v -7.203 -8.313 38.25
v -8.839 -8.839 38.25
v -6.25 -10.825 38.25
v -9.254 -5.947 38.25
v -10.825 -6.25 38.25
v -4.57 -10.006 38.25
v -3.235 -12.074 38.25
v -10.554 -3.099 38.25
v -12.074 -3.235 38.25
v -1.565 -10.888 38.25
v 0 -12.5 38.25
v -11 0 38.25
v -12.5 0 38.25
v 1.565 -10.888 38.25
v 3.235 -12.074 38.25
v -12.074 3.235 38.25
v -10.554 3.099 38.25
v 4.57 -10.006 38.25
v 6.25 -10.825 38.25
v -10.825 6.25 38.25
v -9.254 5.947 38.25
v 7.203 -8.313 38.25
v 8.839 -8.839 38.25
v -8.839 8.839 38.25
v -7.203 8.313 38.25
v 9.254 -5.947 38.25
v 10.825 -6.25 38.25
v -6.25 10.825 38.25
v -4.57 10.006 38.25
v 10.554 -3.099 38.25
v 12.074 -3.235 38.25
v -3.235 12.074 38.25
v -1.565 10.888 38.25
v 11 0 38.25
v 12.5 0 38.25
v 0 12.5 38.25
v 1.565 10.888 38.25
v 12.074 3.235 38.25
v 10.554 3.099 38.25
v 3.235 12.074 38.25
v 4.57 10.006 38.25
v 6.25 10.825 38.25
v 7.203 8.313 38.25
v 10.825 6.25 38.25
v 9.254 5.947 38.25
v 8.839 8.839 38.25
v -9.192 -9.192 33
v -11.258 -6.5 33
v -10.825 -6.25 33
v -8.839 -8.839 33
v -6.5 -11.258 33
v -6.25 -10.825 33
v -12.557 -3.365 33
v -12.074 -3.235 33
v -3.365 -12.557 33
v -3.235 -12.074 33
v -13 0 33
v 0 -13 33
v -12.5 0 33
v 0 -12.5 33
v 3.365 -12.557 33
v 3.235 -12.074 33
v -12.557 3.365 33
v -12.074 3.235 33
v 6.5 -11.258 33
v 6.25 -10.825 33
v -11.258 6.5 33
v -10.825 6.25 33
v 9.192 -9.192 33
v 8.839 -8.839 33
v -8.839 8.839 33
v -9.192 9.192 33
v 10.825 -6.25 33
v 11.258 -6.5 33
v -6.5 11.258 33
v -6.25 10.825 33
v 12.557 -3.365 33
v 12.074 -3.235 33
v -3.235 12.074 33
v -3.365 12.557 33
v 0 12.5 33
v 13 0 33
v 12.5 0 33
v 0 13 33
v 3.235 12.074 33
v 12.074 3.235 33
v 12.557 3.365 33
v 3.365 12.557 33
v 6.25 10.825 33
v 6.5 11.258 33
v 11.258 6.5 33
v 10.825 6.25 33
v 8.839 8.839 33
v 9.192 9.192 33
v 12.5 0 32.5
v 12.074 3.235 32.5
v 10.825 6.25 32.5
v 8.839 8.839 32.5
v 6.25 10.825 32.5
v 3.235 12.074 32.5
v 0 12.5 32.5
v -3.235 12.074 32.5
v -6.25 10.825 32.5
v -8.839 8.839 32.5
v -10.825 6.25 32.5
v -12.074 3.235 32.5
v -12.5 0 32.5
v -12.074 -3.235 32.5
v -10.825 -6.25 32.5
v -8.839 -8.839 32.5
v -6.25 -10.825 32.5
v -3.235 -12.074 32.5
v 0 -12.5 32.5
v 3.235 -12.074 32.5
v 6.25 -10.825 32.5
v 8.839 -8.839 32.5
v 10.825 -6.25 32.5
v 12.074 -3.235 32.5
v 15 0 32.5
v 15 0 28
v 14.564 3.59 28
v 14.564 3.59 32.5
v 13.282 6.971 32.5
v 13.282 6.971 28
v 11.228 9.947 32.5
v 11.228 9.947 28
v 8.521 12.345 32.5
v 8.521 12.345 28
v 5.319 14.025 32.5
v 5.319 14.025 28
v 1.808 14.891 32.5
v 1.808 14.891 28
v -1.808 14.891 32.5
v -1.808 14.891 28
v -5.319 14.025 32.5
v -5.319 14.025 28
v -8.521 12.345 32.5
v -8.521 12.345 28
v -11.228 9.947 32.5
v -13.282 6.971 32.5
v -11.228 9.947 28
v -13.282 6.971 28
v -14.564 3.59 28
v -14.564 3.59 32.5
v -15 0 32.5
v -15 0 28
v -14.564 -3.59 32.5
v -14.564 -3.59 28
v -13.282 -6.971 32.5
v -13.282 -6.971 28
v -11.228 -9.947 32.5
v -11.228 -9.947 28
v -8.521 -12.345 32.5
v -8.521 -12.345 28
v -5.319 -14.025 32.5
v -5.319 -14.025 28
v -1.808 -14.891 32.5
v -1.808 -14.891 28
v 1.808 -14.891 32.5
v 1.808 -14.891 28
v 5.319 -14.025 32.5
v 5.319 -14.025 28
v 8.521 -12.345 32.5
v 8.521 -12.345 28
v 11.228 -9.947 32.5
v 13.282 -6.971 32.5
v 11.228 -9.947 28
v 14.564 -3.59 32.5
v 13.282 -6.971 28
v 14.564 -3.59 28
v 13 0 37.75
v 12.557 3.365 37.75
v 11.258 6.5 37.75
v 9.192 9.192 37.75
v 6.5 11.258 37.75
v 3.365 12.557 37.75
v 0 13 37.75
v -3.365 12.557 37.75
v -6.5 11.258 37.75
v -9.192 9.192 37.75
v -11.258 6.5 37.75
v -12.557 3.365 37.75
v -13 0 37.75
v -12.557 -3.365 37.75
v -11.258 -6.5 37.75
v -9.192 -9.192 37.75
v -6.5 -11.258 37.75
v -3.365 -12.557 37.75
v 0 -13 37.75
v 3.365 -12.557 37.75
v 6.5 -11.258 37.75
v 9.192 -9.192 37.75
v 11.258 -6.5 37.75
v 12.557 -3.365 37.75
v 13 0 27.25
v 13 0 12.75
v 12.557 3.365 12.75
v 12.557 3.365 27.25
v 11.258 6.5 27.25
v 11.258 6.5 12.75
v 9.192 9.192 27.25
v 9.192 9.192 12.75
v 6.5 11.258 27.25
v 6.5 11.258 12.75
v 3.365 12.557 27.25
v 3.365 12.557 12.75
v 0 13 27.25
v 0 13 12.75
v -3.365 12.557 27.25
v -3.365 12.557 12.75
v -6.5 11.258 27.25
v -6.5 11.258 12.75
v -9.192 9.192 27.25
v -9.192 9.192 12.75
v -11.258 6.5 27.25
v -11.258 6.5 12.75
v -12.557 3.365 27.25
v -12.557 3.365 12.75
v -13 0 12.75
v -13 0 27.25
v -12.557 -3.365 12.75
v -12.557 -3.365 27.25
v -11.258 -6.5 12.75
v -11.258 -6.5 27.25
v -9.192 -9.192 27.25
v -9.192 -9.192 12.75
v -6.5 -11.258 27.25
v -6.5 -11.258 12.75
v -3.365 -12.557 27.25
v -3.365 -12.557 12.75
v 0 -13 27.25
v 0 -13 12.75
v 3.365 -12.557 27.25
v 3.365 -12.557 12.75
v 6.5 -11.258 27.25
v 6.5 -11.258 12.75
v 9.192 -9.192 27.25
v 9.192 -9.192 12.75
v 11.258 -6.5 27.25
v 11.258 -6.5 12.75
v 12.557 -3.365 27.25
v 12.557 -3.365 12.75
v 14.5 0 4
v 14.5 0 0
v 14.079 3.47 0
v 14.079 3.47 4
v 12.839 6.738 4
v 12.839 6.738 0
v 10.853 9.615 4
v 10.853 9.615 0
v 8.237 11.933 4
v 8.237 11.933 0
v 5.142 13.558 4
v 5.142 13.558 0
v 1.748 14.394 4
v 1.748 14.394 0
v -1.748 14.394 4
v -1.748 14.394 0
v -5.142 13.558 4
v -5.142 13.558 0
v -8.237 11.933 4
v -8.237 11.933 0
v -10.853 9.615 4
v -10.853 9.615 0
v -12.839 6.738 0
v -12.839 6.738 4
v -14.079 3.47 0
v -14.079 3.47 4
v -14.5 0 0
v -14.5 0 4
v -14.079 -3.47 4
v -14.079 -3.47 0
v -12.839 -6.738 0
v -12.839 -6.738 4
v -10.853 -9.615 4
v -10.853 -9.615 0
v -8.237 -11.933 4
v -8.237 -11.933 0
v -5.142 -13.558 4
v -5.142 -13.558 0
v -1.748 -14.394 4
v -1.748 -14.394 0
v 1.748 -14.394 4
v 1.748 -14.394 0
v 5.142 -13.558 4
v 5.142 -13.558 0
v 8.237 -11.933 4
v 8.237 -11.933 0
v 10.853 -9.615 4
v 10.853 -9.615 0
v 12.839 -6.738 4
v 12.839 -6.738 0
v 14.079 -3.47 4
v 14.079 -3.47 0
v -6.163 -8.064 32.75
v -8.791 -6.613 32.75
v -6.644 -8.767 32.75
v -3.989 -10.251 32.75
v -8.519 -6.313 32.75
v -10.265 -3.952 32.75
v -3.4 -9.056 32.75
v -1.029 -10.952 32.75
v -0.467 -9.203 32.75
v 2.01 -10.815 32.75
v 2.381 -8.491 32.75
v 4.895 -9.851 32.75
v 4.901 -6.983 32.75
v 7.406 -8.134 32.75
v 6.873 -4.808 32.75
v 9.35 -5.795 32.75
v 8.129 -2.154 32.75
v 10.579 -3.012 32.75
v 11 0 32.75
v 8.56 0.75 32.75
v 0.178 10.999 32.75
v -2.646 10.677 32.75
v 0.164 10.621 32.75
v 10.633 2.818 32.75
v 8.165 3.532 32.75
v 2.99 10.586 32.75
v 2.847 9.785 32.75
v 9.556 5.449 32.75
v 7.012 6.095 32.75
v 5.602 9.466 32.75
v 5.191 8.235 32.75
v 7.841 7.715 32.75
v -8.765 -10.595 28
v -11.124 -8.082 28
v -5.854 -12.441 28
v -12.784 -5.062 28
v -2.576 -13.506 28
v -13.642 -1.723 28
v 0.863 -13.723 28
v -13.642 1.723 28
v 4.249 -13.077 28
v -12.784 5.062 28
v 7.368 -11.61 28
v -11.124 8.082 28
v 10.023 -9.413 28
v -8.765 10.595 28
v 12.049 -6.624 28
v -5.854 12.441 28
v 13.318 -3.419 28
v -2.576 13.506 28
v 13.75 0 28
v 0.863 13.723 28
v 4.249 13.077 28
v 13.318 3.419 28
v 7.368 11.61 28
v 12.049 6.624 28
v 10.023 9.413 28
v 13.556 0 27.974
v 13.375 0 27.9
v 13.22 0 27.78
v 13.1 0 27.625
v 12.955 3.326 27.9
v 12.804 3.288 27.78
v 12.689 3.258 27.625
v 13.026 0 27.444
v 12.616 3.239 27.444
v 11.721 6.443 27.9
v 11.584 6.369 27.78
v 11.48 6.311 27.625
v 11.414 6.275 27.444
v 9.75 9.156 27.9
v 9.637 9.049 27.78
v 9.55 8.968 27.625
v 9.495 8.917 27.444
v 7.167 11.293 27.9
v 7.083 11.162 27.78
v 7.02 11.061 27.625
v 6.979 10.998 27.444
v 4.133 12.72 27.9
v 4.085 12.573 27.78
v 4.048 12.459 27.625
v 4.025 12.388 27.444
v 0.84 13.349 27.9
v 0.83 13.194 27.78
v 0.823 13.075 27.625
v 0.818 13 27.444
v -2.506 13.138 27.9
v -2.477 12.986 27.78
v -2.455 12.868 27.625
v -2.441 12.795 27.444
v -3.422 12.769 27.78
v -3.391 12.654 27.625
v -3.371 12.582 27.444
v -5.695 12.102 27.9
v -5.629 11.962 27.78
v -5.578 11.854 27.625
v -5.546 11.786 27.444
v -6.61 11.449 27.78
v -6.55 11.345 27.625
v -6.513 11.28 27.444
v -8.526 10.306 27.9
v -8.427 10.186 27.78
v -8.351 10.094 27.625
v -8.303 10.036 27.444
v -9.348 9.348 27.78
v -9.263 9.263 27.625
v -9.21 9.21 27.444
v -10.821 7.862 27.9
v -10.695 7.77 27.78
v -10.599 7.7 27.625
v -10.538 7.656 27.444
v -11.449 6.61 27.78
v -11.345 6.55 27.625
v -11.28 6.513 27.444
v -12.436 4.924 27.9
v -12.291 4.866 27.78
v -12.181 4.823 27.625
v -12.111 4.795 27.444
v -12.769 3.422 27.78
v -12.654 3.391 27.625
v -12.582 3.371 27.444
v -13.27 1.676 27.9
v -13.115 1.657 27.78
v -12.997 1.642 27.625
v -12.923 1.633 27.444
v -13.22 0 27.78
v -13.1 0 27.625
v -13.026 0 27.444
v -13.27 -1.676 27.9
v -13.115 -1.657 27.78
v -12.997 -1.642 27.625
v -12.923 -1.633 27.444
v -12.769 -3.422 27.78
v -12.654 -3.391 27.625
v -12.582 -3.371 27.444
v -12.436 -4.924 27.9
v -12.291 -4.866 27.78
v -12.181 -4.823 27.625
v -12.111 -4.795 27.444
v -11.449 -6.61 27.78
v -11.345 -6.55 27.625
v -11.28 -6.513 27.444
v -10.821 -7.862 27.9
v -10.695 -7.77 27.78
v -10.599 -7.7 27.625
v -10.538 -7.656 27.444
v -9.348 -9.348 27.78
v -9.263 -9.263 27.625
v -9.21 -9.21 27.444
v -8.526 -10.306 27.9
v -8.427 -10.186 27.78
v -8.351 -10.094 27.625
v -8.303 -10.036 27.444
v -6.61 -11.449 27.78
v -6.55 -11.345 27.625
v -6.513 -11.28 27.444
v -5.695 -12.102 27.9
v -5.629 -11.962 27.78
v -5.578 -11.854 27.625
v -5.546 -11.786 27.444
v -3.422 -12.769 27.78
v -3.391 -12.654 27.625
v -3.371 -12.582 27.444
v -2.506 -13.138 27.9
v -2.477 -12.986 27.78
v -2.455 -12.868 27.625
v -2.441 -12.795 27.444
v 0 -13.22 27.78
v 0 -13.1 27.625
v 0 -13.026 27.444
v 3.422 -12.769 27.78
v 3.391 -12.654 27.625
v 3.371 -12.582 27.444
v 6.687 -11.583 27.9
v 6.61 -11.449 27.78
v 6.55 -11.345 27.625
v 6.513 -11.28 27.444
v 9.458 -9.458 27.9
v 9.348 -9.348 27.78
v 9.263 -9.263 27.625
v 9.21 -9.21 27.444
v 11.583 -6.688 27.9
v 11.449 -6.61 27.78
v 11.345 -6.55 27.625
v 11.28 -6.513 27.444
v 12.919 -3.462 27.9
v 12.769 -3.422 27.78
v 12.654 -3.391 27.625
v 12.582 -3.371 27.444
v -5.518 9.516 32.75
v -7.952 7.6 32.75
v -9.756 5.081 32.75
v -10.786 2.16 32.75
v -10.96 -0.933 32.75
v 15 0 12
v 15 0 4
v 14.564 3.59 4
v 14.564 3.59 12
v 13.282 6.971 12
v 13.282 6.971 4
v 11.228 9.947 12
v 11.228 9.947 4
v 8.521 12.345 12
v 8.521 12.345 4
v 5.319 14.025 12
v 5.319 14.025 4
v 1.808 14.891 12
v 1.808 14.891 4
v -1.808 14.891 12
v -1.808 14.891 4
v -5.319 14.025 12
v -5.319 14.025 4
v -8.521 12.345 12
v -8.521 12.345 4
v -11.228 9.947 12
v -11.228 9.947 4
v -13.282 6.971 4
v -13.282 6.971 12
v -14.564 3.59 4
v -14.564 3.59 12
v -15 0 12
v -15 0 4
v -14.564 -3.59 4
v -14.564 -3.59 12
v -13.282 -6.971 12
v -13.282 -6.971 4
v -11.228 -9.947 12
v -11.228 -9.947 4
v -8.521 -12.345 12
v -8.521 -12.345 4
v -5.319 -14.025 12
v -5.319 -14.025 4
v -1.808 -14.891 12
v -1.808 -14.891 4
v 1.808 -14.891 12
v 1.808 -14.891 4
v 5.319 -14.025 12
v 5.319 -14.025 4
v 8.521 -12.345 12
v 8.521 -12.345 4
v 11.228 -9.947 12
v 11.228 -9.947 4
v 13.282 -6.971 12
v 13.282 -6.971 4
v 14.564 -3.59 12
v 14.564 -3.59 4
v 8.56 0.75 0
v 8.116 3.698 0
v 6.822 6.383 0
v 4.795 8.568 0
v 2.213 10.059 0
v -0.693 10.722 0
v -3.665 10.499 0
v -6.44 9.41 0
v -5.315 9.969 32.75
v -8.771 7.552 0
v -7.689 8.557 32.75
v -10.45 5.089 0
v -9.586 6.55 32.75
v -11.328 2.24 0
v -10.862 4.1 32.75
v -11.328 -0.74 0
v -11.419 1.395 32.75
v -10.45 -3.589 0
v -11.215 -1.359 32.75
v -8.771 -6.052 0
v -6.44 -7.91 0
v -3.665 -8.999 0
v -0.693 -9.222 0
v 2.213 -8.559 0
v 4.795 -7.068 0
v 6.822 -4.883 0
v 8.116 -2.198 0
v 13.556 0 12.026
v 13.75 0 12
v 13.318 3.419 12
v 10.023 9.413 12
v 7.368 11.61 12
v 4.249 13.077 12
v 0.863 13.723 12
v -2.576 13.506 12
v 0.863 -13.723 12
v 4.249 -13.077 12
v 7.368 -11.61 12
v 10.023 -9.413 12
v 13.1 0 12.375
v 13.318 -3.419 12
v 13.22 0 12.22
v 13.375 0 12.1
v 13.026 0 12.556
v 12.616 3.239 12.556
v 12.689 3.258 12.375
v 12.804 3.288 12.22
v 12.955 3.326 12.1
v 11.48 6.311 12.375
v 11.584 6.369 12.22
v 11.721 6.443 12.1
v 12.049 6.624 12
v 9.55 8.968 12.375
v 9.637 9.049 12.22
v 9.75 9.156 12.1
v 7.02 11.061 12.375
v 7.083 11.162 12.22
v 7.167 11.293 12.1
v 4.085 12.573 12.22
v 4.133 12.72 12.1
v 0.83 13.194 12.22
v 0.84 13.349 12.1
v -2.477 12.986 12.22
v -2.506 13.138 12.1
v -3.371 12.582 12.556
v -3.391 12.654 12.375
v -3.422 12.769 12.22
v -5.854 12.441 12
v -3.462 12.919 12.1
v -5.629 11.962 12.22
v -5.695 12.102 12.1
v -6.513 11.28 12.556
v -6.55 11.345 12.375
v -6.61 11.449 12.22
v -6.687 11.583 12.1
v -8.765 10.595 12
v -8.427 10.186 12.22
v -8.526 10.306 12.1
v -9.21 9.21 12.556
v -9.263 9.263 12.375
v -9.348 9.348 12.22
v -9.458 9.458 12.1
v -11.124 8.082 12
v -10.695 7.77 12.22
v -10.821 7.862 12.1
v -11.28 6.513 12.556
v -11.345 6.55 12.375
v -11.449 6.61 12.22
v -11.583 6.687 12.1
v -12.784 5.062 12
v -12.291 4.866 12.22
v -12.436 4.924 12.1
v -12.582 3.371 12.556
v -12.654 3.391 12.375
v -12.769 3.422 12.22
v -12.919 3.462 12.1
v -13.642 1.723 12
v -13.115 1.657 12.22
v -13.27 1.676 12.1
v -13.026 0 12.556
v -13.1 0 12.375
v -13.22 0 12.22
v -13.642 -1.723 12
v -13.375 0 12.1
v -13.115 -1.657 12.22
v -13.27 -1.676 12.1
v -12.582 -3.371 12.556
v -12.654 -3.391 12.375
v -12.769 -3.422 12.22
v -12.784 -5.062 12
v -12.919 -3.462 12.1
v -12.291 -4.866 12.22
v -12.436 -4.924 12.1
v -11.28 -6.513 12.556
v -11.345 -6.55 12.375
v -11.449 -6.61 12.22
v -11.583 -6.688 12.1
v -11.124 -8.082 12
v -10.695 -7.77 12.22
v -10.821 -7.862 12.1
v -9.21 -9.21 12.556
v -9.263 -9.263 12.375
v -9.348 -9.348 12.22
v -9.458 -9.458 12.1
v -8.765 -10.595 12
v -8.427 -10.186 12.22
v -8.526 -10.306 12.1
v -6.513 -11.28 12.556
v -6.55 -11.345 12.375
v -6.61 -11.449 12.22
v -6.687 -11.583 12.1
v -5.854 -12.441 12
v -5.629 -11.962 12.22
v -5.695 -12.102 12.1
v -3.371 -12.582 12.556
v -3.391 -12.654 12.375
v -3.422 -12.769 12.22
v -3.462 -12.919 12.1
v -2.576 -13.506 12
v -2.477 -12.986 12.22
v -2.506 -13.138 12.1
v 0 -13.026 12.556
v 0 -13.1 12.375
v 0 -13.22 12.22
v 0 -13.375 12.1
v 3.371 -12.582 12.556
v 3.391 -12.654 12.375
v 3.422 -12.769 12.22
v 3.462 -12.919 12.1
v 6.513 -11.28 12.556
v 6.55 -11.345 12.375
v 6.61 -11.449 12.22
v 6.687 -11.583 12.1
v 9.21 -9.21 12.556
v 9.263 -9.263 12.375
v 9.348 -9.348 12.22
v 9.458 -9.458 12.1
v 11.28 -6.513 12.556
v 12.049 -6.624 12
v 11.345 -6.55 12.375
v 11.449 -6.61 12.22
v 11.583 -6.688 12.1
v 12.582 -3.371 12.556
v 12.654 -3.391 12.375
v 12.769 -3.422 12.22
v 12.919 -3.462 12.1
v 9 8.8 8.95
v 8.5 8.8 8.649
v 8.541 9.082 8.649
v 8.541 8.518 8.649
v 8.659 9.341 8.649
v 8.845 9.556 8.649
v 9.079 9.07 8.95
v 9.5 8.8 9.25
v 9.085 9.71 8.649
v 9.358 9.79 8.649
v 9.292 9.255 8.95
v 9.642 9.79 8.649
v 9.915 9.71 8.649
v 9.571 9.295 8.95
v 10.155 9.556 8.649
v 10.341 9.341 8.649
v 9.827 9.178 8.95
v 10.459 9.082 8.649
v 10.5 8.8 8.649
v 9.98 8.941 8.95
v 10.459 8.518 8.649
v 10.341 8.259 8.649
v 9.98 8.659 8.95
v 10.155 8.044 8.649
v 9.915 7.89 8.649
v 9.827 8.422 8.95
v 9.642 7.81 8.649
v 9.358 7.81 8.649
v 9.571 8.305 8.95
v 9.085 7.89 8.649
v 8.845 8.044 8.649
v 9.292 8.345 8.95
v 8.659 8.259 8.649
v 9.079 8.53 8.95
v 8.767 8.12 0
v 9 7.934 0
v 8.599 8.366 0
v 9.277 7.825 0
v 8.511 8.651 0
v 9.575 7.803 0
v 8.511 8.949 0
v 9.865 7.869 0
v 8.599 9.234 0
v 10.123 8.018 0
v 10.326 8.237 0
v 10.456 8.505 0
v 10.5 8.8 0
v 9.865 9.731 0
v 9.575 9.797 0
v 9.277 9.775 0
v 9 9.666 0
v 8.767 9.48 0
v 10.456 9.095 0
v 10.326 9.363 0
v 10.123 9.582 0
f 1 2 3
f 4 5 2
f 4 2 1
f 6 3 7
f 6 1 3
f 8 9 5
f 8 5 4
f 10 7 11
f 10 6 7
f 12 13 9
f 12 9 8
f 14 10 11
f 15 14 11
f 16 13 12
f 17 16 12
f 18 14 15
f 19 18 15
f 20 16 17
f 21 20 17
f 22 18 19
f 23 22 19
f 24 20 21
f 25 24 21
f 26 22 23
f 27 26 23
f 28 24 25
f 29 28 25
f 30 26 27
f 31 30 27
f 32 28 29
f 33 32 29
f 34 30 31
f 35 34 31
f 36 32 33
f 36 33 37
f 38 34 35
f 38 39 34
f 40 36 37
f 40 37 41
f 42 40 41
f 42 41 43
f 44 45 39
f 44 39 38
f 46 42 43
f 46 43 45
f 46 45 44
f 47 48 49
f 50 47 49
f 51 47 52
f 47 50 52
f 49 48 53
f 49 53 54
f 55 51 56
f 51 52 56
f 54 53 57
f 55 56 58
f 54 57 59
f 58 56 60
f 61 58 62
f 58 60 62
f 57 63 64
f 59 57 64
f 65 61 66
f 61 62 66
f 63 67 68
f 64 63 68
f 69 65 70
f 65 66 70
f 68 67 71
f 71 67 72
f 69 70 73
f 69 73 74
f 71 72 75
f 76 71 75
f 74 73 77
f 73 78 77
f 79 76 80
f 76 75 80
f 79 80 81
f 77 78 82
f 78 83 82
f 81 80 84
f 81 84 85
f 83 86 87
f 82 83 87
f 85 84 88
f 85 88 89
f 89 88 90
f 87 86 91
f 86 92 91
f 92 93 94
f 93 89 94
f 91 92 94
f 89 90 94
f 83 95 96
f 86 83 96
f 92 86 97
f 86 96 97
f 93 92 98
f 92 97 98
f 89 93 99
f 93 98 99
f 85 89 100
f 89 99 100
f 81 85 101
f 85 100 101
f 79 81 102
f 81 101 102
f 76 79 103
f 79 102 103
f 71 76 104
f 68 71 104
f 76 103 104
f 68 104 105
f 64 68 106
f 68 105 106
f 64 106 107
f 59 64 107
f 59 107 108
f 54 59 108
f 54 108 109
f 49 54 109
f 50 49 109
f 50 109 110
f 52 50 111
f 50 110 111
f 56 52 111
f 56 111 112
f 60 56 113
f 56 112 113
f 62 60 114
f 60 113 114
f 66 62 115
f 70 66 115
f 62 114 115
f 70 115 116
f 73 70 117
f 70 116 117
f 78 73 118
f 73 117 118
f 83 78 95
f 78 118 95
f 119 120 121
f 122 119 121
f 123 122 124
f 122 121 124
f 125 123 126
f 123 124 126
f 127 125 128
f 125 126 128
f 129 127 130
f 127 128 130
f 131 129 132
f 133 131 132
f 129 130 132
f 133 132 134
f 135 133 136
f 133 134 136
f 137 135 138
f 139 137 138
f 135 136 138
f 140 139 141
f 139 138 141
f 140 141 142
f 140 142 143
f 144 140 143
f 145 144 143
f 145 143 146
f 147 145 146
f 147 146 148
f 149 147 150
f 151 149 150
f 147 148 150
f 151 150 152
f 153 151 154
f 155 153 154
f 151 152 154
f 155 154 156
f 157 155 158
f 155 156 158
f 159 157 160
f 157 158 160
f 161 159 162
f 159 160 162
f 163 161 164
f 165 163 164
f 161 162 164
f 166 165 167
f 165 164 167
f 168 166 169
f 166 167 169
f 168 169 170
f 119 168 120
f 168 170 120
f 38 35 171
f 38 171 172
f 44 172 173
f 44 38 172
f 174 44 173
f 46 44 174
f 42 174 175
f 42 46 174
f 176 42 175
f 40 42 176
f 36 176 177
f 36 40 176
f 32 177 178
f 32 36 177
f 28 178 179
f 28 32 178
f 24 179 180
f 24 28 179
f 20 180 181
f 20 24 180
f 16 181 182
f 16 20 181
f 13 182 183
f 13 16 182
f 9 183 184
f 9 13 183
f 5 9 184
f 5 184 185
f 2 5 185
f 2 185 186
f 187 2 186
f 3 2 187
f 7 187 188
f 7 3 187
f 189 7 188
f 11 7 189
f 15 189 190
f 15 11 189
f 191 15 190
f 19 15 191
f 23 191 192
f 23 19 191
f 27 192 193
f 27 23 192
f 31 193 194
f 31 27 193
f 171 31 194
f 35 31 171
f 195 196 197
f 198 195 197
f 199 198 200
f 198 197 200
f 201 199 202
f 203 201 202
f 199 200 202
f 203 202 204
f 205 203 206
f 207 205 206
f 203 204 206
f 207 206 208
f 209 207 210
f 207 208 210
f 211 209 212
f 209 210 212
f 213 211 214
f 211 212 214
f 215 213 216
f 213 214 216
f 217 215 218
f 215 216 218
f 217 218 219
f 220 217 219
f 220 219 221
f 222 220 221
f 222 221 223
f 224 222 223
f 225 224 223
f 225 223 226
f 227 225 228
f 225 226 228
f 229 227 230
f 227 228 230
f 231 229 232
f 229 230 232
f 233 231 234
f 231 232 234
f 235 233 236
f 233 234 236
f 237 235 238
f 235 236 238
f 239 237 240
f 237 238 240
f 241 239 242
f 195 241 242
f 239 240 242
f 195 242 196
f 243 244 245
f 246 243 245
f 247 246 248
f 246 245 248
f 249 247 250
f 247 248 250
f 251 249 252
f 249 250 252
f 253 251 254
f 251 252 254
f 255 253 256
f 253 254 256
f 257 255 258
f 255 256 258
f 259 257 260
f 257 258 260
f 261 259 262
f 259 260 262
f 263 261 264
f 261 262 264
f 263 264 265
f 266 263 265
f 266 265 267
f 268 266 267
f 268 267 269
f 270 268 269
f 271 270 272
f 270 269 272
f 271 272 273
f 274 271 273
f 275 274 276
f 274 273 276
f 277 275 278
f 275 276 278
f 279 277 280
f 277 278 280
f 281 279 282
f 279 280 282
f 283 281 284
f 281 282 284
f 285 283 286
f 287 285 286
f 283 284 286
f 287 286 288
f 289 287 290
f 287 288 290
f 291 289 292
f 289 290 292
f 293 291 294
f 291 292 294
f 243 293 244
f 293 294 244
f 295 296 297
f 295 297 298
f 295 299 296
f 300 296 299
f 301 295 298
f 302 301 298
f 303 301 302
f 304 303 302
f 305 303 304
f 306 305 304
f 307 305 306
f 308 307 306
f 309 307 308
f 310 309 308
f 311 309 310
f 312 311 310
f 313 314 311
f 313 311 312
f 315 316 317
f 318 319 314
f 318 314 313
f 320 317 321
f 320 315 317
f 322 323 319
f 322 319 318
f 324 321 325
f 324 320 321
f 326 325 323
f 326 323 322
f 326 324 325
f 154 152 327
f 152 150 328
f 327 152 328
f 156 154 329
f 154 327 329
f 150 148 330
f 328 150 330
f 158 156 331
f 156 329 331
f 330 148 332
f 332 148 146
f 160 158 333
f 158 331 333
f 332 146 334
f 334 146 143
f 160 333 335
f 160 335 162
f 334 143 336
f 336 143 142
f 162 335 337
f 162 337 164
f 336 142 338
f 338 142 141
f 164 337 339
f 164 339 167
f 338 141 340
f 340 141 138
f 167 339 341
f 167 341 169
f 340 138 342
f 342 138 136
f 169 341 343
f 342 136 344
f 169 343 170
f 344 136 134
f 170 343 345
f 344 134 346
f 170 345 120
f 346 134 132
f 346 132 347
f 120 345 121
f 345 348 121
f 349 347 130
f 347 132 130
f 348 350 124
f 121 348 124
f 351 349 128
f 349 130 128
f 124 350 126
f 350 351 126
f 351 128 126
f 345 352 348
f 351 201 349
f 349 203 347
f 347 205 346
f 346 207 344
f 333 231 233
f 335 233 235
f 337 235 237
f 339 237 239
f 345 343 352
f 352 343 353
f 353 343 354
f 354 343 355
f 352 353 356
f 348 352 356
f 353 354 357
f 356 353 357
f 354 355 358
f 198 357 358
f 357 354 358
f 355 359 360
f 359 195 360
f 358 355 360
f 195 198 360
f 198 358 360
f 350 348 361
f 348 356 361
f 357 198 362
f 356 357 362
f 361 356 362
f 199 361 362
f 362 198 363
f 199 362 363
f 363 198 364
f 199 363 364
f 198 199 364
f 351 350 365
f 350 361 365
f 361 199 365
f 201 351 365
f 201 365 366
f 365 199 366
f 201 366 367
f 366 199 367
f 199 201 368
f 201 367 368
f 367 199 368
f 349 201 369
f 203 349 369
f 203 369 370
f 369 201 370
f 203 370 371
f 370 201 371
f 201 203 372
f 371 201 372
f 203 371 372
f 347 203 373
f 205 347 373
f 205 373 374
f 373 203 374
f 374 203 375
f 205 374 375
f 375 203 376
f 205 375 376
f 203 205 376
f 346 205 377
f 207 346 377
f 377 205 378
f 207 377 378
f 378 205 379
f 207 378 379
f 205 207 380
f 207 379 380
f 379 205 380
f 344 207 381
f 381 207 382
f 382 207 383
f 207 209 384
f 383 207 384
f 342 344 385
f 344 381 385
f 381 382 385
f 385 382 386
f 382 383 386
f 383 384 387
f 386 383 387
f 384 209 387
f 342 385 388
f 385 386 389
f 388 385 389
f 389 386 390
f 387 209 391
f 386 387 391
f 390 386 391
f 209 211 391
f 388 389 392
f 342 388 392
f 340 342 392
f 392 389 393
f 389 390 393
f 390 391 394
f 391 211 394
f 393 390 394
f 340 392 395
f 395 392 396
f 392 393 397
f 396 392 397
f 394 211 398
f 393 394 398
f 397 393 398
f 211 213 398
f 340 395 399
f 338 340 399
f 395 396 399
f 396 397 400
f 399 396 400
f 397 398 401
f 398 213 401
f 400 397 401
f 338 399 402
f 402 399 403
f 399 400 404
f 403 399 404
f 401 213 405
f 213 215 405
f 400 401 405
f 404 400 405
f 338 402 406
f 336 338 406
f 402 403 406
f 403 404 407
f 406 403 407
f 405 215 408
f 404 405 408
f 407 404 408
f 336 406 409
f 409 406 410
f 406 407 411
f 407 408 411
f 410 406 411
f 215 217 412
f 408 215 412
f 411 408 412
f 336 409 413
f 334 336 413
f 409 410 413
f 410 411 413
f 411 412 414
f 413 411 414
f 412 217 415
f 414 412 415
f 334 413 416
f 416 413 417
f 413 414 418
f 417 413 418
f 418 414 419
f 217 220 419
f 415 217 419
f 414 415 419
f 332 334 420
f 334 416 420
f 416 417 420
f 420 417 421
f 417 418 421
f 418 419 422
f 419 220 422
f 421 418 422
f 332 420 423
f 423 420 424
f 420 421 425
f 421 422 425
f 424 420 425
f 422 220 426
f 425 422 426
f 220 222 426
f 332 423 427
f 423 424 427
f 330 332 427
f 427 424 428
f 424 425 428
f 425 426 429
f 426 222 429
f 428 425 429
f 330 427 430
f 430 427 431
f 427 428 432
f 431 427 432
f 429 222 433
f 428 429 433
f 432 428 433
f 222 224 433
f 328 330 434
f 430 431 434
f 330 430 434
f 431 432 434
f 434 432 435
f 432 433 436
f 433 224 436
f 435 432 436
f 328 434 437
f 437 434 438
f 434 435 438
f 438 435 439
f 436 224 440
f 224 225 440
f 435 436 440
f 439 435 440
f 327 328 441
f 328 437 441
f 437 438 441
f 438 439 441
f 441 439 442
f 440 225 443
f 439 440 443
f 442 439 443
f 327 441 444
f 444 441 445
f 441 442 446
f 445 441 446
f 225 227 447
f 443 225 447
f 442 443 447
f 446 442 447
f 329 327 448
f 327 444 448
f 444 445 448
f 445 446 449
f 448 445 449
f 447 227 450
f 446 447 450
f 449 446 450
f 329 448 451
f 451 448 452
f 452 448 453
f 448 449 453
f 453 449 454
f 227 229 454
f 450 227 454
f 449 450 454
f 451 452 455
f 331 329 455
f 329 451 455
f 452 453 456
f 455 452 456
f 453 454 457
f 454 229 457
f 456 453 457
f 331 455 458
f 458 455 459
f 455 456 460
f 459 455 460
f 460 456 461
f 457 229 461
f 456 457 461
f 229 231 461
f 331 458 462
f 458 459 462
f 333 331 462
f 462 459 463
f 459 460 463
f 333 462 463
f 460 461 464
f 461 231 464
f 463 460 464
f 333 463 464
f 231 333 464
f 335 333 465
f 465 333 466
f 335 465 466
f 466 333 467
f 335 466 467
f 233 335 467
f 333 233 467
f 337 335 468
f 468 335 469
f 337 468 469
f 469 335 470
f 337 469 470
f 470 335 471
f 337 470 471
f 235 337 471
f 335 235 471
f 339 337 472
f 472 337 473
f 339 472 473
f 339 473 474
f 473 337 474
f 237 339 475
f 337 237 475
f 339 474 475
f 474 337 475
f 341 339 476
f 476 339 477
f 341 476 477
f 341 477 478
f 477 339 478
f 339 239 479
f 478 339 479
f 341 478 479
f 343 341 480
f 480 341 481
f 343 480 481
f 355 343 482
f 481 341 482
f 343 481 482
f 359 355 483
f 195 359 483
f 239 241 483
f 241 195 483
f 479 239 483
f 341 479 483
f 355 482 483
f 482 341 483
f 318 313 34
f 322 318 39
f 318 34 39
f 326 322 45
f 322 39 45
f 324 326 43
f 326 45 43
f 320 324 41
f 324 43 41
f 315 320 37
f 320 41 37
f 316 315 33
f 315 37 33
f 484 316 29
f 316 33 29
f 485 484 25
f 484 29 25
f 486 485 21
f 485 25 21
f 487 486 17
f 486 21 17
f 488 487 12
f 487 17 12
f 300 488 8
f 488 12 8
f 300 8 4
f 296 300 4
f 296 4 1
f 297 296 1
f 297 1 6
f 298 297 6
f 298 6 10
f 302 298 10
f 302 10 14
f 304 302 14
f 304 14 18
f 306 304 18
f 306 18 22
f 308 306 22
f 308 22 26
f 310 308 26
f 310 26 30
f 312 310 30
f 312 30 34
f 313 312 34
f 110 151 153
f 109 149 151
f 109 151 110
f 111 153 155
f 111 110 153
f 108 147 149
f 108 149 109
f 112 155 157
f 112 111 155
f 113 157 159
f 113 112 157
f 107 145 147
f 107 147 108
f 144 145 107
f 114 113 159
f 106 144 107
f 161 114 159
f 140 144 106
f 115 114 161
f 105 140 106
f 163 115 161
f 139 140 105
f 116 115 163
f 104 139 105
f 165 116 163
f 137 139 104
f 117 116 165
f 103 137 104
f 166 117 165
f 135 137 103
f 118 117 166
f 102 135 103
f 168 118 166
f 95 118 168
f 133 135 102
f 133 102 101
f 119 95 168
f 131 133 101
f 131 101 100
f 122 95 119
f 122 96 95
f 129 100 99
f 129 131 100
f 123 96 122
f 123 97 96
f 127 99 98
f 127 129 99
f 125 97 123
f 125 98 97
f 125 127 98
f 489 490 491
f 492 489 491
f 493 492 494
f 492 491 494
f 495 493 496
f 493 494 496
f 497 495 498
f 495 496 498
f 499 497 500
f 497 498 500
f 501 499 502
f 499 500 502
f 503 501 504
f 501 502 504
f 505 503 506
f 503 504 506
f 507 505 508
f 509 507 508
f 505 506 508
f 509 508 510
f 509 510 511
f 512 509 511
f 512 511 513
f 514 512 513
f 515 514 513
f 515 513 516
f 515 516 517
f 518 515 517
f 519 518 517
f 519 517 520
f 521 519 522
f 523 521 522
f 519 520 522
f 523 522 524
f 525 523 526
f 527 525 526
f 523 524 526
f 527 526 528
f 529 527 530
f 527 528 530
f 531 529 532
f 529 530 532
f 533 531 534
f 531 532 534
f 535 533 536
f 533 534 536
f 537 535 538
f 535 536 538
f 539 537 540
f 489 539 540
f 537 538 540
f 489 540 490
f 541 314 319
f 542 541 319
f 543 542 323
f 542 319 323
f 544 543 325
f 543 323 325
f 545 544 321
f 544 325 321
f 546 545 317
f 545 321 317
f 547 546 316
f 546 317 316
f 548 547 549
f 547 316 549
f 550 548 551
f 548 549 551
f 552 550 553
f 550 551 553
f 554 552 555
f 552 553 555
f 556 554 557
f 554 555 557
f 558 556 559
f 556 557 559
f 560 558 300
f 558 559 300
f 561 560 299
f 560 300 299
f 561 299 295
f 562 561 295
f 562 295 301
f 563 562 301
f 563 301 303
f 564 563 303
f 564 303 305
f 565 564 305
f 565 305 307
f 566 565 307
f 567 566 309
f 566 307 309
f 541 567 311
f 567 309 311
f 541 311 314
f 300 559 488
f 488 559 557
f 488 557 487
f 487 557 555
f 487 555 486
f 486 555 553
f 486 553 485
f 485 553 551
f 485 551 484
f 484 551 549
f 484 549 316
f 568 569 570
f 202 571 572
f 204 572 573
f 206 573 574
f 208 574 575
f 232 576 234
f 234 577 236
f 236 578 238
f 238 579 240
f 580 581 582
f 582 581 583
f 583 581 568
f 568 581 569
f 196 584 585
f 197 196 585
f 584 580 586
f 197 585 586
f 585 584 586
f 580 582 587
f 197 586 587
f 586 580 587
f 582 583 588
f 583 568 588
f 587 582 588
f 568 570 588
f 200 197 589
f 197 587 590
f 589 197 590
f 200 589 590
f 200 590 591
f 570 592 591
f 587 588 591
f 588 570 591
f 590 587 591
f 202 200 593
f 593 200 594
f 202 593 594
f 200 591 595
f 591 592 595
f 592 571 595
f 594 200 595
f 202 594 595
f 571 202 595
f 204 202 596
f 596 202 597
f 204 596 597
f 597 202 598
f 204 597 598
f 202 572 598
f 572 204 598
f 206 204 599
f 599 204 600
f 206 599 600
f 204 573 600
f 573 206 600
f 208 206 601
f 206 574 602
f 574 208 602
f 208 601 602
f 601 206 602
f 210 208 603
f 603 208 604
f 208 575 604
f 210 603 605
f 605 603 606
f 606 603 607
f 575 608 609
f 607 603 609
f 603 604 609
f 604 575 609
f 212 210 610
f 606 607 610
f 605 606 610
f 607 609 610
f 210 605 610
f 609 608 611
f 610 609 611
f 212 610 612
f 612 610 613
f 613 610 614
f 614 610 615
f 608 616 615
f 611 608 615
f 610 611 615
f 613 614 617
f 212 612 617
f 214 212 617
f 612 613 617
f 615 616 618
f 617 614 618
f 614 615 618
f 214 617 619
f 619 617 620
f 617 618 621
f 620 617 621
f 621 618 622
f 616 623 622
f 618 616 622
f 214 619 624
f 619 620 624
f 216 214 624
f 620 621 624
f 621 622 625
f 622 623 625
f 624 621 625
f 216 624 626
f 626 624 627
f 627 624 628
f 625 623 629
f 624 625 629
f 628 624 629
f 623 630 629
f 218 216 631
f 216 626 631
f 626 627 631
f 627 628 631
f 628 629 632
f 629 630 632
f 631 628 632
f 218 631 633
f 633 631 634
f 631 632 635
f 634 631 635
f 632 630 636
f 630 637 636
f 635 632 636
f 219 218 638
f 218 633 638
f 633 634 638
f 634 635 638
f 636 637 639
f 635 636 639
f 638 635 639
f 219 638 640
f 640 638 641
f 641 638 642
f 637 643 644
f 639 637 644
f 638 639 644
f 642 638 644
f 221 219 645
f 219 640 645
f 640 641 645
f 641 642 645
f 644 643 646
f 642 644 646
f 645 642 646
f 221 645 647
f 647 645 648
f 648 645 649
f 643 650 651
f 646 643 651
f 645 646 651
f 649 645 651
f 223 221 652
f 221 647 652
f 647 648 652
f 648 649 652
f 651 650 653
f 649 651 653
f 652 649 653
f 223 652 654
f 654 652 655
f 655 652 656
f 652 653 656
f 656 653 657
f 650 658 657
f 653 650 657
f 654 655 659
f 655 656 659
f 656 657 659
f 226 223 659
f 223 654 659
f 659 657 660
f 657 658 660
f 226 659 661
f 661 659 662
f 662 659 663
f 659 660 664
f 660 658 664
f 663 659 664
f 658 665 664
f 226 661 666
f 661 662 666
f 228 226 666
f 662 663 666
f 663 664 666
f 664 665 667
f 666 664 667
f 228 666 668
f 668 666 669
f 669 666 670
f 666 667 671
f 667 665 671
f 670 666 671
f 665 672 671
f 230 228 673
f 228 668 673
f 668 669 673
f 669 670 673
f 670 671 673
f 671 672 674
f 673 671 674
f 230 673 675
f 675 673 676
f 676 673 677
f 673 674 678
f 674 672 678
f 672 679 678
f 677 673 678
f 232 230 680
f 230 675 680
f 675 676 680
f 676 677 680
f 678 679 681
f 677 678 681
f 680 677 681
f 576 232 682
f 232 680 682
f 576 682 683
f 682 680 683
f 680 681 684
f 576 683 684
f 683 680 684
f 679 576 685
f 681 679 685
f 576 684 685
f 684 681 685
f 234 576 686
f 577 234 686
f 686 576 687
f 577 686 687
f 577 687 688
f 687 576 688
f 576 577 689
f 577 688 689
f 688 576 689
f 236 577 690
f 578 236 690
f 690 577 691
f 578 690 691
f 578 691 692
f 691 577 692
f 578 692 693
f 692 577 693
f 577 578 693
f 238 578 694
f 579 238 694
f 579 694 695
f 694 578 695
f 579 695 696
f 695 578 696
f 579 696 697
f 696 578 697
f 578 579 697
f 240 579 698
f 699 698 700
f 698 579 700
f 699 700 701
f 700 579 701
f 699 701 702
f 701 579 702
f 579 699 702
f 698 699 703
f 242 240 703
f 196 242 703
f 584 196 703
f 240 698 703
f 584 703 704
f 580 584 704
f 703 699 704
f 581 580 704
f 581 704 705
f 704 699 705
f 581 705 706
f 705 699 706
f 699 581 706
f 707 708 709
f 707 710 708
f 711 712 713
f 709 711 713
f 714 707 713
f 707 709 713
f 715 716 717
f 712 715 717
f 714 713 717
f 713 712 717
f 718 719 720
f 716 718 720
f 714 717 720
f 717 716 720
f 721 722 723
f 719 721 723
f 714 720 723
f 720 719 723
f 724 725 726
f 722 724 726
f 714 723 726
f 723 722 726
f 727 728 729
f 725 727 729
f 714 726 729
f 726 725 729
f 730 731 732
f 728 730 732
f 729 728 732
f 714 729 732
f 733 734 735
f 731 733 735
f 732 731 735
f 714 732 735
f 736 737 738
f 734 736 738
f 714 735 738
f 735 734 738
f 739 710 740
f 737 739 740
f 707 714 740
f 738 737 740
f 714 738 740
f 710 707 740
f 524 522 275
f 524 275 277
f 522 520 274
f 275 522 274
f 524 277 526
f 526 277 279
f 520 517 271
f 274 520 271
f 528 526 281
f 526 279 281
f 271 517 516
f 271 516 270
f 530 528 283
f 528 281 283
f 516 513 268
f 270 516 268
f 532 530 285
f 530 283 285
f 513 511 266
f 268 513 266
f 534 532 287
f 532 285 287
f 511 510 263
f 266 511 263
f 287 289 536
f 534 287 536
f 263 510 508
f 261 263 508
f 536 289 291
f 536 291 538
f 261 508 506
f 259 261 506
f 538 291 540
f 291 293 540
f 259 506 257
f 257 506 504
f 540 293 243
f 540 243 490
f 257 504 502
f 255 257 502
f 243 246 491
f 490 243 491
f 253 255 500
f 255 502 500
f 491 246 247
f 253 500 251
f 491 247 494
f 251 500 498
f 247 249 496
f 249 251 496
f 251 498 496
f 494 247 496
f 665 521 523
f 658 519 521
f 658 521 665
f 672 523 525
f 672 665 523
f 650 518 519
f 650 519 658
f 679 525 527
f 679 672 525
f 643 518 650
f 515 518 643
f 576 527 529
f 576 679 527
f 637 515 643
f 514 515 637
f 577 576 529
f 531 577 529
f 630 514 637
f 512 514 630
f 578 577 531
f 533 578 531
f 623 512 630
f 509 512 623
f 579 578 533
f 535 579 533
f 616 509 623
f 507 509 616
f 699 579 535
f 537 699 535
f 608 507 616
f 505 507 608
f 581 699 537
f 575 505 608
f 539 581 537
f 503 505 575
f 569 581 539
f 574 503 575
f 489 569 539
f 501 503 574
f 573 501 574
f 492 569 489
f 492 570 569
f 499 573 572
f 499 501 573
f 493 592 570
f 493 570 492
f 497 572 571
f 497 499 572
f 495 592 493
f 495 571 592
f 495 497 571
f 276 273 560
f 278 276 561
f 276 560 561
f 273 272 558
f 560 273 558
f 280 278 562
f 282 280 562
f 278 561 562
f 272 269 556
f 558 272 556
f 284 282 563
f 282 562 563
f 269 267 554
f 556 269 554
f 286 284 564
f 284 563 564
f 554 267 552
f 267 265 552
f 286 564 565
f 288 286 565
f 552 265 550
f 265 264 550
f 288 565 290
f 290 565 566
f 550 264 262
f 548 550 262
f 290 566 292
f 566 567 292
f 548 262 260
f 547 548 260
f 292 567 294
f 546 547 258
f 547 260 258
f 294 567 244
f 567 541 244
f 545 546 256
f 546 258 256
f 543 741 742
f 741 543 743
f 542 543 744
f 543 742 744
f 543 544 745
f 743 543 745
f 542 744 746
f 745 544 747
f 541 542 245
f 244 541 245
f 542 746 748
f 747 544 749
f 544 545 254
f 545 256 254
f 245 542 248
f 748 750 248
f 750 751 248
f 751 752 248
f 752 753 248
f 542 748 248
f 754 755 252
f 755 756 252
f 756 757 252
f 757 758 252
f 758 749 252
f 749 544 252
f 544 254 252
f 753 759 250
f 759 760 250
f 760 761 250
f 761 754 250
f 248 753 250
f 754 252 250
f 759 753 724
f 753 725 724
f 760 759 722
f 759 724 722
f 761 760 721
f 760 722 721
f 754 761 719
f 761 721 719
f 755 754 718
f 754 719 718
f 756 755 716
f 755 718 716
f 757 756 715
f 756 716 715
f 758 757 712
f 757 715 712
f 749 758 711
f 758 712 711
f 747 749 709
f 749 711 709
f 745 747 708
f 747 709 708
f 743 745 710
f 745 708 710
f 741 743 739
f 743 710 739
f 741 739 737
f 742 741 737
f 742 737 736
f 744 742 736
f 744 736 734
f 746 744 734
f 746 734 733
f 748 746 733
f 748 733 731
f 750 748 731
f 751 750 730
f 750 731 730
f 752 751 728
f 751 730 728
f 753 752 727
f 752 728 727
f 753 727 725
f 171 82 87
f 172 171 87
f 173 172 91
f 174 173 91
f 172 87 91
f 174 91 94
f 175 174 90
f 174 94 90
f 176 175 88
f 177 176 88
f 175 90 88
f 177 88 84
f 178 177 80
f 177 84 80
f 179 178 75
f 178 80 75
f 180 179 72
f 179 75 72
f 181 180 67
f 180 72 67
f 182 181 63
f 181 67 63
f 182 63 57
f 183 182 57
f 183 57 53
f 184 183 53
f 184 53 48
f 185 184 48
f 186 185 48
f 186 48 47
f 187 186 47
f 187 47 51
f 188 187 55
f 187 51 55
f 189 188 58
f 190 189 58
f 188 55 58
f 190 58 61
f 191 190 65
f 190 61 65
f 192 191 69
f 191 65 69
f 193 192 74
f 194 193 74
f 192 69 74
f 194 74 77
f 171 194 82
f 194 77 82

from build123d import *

# Parameters (mm, degrees)
SKETCH1_R                    = 14.5
BOSS_EXTRUDE1_DEPTH          = 4
SKETCH2_R                    = 15
BOSS_EXTRUDE2_DEPTH          = 8
SKETCH3_R                    = 13
BOSS_EXTRUDE3_DEPTH          = 16
SKETCH4_R                    = 15
BOSS_EXTRUDE4_DEPTH          = 4.5
SKETCH5_R                    = 12.5
BOSS_EXTRUDE5_DEPTH          = 0.5
SKETCH6_R                    = 13
BOSS_EXTRUDE6_DEPTH          = 5.25
SKETCH7_R                    = 11
CUT_EXTRUDE1_DEPTH           = 5.5
SKETCH8_R                    = 10
CUT_EXTRUDE2_DEPTH           = 32.75
FILLET1_R                    = 0.75
CHAMFER1_SIZE                = 0.5
F_2_0_2_DIAMETER_HOLE3_D     = 2
F_2_0_2_DIAMETER_HOLE3_DEPTH = 8.649139381
F_2_0_2_DIAMETER_HOLE3_TIP   = 0.600860619


with BuildPart() as part:
    # Sketch1 → Boss-Extrude1 (new body)
    with BuildSketch(Plane.XY):
        Circle(SKETCH1_R)
    extrude(amount=BOSS_EXTRUDE1_DEPTH)

    # Sketch2 → Boss-Extrude2 (add)
    with BuildSketch(Plane.XY.offset(4)):
        Circle(SKETCH2_R)
    extrude(amount=BOSS_EXTRUDE2_DEPTH)

    # Sketch3 → Boss-Extrude3 (add)
    with BuildSketch(Plane.XY.offset(12)):
        Circle(SKETCH3_R)
    extrude(amount=BOSS_EXTRUDE3_DEPTH)

    # Sketch4 → Boss-Extrude4 (add)
    with BuildSketch(Plane.XY.offset(28)):
        Circle(SKETCH4_R)
    extrude(amount=BOSS_EXTRUDE4_DEPTH)

    # Sketch5 → Boss-Extrude5 (add)
    with BuildSketch(Plane.XY.offset(32.5)):
        Circle(SKETCH5_R)
    extrude(amount=BOSS_EXTRUDE5_DEPTH)

    # Sketch6 → Boss-Extrude6 (add)
    with BuildSketch(Plane.XY.offset(33)):
        Circle(SKETCH6_R)
    extrude(amount=BOSS_EXTRUDE6_DEPTH)

    # Sketch7 → Cut-Extrude1 (cut)
    with BuildSketch(Plane.XY.offset(38.25)):
        Circle(SKETCH7_R)
    extrude(amount=-CUT_EXTRUDE1_DEPTH, mode=Mode.SUBTRACT)

    # Sketch8 → Cut-Extrude2 (cut)
    with BuildSketch(Plane.XY.offset(32.75)):
        with Locations((-1.44, 0.75)):
            Circle(SKETCH8_R)
    extrude(amount=-CUT_EXTRUDE2_DEPTH, mode=Mode.SUBTRACT)

    # Fillet1
    fillet1_edges = [part.edges().sort_by_distance(p)[0] for p in [
        (-13, 0, 12),
        (-13, 0, 28),
    ]]
    fillet(fillet1_edges, radius=FILLET1_R)

    # Chamfer1
    chamfer1_edges = [part.edges().sort_by_distance(p)[0] for p in [
        (-13, 0, 38.25),
    ]]
    chamfer(chamfer1_edges, length=CHAMFER1_SIZE)

    # Ø2.0 (2) Diameter Hole3
    with Locations(Plane(origin=(0, 0, 0), x_dir=(-1, 0, 0), z_dir=(0, 0, -1))):
        with Locations((-9.5, 8.8)):
            Hole(F_2_0_2_DIAMETER_HOLE3_D / 2, depth=F_2_0_2_DIAMETER_HOLE3_DEPTH)
            with Locations((0, 0, -(F_2_0_2_DIAMETER_HOLE3_DEPTH + F_2_0_2_DIAMETER_HOLE3_TIP / 2))):  # 118° drill point
                Cone(0, F_2_0_2_DIAMETER_HOLE3_D / 2, F_2_0_2_DIAMETER_HOLE3_TIP, mode=Mode.SUBTRACT)


solid = part.part
